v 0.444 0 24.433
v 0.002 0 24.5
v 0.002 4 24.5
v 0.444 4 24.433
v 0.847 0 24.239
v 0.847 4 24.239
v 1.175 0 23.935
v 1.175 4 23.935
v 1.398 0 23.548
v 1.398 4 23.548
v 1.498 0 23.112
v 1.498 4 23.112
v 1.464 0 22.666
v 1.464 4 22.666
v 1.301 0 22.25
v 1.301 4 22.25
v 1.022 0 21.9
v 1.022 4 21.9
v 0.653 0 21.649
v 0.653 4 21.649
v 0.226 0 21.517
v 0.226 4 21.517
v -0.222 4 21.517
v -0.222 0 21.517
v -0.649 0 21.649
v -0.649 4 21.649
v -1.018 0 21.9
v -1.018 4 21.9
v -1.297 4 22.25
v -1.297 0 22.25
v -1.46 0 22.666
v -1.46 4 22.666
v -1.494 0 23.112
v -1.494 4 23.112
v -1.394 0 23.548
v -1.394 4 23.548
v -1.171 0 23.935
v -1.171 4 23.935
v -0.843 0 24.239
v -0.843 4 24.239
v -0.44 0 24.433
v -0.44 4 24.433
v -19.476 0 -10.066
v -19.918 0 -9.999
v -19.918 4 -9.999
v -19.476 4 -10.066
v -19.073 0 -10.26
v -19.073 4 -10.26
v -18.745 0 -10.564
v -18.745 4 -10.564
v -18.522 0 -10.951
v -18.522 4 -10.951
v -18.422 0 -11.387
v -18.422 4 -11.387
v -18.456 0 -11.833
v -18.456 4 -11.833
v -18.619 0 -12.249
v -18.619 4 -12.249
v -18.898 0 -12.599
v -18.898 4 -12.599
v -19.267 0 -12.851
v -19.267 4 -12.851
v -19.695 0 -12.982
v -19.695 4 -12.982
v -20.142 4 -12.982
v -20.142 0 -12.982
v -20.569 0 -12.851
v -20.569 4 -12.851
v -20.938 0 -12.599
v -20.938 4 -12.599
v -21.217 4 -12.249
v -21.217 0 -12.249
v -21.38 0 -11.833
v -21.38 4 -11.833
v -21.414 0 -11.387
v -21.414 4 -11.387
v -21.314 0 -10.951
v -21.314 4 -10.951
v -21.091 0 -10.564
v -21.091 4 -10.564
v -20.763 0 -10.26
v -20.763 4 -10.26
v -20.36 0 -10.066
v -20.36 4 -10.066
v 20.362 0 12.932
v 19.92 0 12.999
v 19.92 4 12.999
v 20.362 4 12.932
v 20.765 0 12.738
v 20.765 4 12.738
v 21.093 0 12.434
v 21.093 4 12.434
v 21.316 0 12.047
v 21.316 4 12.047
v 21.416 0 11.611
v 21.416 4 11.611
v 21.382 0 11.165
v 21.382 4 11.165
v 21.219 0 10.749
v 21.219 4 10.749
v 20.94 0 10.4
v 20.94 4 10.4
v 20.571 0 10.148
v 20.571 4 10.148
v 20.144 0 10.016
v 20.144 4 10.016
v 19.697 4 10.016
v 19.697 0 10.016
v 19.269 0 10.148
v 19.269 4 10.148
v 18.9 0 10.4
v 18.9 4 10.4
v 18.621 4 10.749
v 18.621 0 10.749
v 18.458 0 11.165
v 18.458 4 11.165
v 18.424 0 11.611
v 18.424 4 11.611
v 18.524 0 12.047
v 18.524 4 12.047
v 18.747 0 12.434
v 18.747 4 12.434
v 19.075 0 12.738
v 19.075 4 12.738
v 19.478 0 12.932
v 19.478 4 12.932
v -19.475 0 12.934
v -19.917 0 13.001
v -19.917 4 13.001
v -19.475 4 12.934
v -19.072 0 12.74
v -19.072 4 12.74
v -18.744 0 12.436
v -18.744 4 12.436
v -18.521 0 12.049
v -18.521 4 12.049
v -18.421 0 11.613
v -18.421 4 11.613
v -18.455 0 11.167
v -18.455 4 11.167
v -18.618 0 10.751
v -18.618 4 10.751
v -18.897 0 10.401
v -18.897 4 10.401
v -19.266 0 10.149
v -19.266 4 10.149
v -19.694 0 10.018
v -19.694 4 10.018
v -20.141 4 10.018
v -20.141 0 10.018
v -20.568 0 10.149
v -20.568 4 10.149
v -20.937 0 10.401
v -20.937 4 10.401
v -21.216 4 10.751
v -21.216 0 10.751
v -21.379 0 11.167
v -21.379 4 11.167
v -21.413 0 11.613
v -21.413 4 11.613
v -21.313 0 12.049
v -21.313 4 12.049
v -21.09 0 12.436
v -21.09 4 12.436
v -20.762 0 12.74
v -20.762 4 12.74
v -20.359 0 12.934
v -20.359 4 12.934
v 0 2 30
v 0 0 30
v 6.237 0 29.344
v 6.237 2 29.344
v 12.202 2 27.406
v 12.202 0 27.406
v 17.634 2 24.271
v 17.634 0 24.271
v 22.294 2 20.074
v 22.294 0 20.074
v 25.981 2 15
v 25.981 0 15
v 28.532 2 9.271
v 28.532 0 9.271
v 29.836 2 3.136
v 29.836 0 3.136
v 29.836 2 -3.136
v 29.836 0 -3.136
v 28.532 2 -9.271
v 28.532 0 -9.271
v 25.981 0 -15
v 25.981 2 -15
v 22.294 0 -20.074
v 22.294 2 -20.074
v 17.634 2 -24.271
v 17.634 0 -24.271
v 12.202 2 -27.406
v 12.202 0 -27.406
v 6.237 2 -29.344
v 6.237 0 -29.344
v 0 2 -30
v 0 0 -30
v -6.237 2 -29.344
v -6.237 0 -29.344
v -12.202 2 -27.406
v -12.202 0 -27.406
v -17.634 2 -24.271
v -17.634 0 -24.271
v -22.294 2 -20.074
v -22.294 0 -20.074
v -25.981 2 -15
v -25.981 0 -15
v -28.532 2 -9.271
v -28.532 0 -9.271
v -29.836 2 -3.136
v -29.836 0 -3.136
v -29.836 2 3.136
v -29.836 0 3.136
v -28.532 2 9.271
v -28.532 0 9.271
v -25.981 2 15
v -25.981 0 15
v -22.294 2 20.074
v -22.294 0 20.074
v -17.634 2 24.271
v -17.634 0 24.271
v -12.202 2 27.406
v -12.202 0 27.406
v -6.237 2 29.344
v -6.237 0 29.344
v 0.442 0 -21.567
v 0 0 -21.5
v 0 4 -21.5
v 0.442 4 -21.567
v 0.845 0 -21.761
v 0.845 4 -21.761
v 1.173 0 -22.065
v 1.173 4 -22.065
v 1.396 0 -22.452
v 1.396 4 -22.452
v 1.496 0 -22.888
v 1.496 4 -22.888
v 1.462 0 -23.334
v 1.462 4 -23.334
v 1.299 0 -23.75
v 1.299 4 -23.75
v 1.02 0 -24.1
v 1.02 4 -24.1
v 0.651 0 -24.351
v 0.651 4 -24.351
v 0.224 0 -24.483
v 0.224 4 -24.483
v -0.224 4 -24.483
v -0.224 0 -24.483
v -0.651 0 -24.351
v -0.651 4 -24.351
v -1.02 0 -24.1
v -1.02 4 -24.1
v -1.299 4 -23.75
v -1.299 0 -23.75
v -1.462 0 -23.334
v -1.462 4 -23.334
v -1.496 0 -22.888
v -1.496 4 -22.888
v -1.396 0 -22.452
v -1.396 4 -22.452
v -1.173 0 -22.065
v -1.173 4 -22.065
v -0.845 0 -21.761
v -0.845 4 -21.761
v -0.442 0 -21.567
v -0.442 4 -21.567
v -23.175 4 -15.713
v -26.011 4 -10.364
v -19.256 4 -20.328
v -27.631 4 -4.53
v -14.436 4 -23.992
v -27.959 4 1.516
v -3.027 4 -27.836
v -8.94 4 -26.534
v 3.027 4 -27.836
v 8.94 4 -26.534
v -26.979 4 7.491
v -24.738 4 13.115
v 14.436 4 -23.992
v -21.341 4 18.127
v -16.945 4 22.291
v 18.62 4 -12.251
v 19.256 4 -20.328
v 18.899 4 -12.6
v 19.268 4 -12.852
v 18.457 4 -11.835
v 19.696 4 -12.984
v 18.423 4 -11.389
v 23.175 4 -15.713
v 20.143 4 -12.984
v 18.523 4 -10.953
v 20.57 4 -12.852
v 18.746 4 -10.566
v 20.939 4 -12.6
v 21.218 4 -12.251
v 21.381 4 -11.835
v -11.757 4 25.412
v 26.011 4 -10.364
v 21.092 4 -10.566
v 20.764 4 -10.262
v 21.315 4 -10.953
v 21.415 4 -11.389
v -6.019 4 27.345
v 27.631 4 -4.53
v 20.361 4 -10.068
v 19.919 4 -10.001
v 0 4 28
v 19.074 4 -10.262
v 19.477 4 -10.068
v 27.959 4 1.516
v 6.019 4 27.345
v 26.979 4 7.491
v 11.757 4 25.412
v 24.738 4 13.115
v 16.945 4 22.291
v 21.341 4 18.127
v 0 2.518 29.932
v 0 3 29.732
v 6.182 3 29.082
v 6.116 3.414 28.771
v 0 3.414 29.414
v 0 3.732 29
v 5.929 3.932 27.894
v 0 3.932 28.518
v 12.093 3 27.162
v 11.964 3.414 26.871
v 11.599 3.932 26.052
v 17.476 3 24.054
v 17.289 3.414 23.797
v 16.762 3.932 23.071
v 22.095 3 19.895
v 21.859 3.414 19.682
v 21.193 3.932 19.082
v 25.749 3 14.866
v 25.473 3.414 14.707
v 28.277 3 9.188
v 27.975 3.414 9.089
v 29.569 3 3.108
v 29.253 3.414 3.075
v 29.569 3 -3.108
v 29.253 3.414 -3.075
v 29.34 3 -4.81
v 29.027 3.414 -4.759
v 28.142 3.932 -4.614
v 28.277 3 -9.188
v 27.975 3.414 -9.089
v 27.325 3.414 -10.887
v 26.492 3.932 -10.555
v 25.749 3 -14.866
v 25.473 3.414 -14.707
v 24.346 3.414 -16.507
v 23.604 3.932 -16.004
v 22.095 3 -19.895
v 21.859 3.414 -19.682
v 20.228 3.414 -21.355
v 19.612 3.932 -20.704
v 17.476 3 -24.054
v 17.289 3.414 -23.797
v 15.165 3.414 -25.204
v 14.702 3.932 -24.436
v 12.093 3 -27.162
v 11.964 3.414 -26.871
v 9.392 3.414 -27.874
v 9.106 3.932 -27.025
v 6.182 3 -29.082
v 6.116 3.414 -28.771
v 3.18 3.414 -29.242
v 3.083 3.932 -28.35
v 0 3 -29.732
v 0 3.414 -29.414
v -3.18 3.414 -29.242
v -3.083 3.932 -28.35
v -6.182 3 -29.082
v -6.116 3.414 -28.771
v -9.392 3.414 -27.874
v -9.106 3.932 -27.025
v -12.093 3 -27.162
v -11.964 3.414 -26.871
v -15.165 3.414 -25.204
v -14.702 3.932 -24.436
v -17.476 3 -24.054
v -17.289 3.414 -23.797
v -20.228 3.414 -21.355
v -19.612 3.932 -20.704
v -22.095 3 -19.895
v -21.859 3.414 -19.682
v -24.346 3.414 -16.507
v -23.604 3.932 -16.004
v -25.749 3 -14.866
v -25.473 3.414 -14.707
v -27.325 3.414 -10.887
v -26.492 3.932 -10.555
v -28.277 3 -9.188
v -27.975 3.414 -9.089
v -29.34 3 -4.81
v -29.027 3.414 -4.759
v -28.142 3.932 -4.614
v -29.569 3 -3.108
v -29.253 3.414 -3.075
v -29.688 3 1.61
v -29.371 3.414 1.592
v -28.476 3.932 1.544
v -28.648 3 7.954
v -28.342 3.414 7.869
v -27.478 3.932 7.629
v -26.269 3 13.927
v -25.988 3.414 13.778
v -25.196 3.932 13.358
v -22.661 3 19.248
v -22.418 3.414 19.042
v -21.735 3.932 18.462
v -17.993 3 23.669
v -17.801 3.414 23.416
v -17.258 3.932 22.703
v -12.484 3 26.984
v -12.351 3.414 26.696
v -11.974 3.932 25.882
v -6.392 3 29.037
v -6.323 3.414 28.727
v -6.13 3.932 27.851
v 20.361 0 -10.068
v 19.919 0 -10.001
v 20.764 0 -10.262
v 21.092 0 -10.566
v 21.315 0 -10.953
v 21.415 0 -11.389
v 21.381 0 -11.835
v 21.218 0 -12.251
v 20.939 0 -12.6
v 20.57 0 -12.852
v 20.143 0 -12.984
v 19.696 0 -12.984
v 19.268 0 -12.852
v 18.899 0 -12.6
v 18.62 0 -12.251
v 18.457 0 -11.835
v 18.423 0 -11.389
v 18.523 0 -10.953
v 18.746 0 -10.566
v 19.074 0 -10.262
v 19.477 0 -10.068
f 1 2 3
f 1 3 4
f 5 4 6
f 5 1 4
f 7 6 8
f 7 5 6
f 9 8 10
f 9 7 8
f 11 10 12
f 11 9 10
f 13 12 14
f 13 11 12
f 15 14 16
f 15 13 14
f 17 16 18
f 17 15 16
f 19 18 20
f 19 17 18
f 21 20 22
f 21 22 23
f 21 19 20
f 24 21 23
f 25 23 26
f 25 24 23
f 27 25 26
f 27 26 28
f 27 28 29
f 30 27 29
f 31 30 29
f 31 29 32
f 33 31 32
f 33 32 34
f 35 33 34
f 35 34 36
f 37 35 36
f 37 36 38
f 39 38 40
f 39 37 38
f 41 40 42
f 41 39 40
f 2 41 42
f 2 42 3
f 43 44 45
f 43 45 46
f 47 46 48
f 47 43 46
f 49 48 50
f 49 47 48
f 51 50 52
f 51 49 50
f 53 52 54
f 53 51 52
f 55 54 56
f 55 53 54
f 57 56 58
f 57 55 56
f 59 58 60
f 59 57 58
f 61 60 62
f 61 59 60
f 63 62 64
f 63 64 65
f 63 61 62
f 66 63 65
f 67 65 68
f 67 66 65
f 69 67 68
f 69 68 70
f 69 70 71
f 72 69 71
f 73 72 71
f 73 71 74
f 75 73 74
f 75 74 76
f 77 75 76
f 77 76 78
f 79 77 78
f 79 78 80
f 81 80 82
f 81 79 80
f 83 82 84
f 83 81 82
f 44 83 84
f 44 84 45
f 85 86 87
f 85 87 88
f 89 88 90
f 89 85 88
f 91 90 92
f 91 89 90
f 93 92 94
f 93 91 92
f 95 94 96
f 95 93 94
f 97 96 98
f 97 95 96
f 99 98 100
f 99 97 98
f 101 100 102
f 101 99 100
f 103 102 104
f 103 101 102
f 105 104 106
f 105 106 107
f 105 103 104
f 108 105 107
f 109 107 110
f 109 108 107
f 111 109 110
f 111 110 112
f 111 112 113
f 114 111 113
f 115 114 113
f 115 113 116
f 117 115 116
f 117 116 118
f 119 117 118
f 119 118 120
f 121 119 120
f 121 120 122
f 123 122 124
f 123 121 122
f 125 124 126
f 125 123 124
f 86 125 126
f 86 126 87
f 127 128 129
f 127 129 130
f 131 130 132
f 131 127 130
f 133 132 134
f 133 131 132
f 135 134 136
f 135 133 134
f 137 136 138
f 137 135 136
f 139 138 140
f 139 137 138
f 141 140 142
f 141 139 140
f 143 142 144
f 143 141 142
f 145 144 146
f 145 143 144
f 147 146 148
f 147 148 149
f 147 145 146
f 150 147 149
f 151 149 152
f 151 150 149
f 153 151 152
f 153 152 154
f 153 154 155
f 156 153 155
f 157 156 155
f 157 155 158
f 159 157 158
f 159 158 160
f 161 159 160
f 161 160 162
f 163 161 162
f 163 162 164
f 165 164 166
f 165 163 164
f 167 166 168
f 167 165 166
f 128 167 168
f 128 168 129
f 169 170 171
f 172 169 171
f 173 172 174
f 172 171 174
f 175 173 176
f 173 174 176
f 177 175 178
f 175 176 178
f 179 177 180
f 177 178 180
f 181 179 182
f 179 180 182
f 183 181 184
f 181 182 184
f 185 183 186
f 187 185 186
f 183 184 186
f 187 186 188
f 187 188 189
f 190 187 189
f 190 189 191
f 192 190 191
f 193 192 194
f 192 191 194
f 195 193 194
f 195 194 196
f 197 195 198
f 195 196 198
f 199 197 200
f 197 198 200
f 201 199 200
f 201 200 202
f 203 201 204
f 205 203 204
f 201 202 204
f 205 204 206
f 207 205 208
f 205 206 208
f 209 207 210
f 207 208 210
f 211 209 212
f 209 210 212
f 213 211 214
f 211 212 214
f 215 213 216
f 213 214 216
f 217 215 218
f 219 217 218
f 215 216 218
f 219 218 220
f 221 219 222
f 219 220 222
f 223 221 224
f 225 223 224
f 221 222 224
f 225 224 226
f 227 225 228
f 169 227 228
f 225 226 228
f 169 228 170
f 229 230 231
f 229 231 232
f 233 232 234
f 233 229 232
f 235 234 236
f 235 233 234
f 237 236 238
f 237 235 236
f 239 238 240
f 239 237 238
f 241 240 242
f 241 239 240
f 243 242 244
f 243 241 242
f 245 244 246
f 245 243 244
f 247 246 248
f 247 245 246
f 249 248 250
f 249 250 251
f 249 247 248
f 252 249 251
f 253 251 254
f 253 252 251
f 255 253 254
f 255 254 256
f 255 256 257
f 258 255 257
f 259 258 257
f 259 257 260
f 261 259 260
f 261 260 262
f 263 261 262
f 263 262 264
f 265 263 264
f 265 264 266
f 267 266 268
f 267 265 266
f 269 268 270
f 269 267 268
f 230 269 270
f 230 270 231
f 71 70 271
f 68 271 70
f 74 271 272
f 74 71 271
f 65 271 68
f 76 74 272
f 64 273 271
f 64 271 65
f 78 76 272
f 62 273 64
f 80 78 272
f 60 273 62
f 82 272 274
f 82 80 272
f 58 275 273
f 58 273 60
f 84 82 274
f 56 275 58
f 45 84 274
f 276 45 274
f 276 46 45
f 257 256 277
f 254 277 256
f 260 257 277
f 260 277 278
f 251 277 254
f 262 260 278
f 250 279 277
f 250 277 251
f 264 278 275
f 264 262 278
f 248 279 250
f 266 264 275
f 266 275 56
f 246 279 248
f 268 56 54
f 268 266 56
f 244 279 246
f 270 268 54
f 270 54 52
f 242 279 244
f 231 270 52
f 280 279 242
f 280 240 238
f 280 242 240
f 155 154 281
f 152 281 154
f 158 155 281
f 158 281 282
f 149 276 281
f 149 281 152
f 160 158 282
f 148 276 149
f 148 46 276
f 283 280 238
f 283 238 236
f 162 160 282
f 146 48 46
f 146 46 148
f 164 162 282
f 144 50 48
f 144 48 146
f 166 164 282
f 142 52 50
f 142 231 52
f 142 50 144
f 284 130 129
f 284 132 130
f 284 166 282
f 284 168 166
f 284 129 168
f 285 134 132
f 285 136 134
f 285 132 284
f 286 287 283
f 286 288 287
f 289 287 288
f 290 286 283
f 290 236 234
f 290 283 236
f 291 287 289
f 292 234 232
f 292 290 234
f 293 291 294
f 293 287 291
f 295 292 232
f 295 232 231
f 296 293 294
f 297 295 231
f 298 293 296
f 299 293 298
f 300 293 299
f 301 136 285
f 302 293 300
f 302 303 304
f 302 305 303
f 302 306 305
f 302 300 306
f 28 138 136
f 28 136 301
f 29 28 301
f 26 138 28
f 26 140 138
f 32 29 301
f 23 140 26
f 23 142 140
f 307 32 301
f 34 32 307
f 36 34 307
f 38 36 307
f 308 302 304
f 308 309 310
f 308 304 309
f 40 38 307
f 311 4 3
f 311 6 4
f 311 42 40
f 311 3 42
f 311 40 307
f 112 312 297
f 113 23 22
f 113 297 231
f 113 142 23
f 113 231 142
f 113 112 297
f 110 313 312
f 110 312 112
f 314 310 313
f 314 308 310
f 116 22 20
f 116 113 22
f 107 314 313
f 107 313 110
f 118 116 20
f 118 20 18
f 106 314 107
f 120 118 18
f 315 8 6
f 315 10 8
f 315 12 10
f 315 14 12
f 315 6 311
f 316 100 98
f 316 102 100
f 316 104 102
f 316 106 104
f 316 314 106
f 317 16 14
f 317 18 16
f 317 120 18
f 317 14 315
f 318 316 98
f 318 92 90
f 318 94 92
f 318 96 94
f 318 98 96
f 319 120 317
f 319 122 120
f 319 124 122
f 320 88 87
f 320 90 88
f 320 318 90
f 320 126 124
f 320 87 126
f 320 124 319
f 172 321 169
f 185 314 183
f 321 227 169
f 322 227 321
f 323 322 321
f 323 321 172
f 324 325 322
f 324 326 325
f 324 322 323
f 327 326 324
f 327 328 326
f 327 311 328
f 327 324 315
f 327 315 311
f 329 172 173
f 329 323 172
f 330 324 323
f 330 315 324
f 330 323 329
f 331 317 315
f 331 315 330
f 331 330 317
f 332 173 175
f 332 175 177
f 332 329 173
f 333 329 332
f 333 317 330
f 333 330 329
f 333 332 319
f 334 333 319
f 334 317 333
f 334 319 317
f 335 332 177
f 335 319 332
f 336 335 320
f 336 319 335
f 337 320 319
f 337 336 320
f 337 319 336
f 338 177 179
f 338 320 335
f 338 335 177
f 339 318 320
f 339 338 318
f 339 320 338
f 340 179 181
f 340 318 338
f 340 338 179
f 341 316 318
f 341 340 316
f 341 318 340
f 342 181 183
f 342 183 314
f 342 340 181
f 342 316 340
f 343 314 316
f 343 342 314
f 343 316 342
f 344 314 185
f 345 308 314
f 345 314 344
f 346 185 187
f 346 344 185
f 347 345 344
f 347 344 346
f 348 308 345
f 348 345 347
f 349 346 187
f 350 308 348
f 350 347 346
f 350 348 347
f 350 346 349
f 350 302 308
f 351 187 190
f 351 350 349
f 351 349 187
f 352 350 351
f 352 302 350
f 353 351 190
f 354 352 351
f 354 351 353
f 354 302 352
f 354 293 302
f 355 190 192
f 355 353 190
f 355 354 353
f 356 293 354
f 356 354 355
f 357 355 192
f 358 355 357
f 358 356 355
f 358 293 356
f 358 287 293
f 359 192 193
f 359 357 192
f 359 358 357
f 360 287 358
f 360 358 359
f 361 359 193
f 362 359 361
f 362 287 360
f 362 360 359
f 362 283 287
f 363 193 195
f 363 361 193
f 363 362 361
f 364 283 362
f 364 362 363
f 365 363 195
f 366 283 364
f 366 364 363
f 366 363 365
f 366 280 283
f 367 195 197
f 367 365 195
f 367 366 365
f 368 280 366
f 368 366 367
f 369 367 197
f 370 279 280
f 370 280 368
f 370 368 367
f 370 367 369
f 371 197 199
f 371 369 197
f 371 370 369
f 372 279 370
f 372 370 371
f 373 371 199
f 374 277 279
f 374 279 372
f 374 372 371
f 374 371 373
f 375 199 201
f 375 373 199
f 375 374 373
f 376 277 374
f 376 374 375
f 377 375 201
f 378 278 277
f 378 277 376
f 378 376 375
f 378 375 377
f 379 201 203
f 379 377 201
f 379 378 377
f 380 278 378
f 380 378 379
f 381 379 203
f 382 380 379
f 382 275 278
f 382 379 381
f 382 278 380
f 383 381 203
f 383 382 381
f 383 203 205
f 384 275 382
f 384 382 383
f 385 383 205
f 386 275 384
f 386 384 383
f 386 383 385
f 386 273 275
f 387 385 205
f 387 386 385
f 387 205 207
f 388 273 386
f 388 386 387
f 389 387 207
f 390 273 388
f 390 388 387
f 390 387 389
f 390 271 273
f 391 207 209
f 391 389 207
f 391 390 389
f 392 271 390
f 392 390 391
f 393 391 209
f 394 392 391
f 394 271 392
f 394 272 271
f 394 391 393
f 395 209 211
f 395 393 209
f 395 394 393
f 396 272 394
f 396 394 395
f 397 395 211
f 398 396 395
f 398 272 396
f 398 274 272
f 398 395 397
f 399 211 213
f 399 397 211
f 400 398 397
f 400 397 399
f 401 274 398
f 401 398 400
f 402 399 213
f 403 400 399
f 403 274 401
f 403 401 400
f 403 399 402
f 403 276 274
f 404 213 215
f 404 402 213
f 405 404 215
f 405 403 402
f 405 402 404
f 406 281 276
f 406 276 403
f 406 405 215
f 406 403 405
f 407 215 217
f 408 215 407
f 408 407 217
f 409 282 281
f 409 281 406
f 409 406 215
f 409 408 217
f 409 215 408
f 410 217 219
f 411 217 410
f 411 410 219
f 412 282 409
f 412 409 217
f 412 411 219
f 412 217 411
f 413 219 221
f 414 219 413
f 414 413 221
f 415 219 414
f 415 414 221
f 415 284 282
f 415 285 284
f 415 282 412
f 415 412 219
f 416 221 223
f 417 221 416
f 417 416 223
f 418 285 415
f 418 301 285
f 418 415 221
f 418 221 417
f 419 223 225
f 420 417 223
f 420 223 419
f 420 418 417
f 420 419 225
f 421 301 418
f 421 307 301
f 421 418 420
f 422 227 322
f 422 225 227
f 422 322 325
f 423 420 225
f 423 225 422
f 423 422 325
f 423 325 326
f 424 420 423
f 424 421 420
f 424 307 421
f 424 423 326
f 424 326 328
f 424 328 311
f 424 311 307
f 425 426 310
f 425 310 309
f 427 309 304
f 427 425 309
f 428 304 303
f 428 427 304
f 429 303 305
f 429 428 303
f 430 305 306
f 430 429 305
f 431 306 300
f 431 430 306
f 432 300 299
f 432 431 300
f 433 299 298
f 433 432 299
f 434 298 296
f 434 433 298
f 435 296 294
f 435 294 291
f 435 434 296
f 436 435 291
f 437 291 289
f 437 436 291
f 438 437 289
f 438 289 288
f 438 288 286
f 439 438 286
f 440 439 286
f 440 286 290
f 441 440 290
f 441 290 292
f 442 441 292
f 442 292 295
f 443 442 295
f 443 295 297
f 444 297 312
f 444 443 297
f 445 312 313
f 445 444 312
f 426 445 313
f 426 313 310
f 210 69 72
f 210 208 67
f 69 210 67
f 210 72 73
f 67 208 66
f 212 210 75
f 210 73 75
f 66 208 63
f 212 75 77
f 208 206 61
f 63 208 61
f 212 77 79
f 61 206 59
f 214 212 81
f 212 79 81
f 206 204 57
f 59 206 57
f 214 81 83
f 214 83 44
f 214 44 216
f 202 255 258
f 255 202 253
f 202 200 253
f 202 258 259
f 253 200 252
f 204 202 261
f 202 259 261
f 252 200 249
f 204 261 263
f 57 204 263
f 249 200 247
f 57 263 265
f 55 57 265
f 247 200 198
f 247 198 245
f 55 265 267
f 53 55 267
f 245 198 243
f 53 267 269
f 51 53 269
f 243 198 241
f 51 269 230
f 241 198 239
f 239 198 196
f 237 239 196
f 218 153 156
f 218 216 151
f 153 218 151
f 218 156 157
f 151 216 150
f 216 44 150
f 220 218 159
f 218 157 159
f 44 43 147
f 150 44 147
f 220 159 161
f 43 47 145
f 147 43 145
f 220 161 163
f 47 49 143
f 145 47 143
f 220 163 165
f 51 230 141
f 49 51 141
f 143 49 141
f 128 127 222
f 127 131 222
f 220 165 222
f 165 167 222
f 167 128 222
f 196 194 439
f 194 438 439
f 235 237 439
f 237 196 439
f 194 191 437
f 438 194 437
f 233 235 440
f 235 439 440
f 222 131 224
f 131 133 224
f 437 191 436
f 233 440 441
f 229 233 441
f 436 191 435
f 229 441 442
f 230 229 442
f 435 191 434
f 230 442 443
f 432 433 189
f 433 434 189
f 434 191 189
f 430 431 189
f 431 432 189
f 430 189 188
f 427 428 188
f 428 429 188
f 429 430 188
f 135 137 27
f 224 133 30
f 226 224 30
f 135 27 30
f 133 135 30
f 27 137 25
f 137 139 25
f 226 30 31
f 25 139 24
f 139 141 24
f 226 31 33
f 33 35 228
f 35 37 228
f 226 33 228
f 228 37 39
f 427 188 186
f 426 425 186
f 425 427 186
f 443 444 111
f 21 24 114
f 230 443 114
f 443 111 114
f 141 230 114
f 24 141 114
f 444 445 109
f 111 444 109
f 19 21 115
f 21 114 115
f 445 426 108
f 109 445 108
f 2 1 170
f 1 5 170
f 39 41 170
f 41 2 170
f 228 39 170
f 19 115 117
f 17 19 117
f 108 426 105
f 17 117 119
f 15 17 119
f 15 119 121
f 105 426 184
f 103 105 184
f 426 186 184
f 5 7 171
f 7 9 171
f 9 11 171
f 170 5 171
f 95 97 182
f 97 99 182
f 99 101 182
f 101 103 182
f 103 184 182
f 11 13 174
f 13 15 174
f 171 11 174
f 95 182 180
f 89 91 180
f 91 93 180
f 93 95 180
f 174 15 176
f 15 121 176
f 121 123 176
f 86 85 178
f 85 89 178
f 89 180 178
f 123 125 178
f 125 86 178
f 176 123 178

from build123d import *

# Parameters (mm, degrees)
SKETCH1_R           = 30
SKETCH1_R_2         = 1.5
BOSS_EXTRUDE1_DEPTH = 4
FILLET1_R           = 2


with BuildPart() as part:
    # Sketch1 → Boss-Extrude1 (new body)
    with BuildSketch(Plane(origin=(0, 0, 0), x_dir=(1, 0, 0), z_dir=(0, 1, 0))):
        with Locations(Location((0, 0, 0), (0, 0, 270))):
            Circle(SKETCH1_R)
        with Locations(Location((0, 23, 0), (0, 0, 270))):
            Circle(SKETCH1_R_2, mode=Mode.SUBTRACT)
        with Locations(Location((19.919084287, 11.500866025, 0), (0, 0, 270))):
            Circle(SKETCH1_R_2, mode=Mode.SUBTRACT)
        with Locations(Location((19.920084287, -11.499133975, 0), (0, 0, 270))):
            Circle(SKETCH1_R_2, mode=Mode.SUBTRACT)
        with Locations(Location((0.002, -23, 0), (0, 0, 270))):
            Circle(SKETCH1_R_2, mode=Mode.SUBTRACT)
        with Locations(Location((-19.917084287, -11.500866025, 0), (0, 0, 270))):
            Circle(SKETCH1_R_2, mode=Mode.SUBTRACT)
        with Locations(Location((-19.918084287, 11.499133975, 0), (0, 0, 270))):
            Circle(SKETCH1_R_2, mode=Mode.SUBTRACT)
    extrude(amount=BOSS_EXTRUDE1_DEPTH)

    # Fillet1
    fillet1_edges = [part.edges().sort_by_distance(p)[0] for p in [
        (0, 4, -30),
    ]]
    fillet(fillet1_edges, radius=FILLET1_R)


solid = part.part
